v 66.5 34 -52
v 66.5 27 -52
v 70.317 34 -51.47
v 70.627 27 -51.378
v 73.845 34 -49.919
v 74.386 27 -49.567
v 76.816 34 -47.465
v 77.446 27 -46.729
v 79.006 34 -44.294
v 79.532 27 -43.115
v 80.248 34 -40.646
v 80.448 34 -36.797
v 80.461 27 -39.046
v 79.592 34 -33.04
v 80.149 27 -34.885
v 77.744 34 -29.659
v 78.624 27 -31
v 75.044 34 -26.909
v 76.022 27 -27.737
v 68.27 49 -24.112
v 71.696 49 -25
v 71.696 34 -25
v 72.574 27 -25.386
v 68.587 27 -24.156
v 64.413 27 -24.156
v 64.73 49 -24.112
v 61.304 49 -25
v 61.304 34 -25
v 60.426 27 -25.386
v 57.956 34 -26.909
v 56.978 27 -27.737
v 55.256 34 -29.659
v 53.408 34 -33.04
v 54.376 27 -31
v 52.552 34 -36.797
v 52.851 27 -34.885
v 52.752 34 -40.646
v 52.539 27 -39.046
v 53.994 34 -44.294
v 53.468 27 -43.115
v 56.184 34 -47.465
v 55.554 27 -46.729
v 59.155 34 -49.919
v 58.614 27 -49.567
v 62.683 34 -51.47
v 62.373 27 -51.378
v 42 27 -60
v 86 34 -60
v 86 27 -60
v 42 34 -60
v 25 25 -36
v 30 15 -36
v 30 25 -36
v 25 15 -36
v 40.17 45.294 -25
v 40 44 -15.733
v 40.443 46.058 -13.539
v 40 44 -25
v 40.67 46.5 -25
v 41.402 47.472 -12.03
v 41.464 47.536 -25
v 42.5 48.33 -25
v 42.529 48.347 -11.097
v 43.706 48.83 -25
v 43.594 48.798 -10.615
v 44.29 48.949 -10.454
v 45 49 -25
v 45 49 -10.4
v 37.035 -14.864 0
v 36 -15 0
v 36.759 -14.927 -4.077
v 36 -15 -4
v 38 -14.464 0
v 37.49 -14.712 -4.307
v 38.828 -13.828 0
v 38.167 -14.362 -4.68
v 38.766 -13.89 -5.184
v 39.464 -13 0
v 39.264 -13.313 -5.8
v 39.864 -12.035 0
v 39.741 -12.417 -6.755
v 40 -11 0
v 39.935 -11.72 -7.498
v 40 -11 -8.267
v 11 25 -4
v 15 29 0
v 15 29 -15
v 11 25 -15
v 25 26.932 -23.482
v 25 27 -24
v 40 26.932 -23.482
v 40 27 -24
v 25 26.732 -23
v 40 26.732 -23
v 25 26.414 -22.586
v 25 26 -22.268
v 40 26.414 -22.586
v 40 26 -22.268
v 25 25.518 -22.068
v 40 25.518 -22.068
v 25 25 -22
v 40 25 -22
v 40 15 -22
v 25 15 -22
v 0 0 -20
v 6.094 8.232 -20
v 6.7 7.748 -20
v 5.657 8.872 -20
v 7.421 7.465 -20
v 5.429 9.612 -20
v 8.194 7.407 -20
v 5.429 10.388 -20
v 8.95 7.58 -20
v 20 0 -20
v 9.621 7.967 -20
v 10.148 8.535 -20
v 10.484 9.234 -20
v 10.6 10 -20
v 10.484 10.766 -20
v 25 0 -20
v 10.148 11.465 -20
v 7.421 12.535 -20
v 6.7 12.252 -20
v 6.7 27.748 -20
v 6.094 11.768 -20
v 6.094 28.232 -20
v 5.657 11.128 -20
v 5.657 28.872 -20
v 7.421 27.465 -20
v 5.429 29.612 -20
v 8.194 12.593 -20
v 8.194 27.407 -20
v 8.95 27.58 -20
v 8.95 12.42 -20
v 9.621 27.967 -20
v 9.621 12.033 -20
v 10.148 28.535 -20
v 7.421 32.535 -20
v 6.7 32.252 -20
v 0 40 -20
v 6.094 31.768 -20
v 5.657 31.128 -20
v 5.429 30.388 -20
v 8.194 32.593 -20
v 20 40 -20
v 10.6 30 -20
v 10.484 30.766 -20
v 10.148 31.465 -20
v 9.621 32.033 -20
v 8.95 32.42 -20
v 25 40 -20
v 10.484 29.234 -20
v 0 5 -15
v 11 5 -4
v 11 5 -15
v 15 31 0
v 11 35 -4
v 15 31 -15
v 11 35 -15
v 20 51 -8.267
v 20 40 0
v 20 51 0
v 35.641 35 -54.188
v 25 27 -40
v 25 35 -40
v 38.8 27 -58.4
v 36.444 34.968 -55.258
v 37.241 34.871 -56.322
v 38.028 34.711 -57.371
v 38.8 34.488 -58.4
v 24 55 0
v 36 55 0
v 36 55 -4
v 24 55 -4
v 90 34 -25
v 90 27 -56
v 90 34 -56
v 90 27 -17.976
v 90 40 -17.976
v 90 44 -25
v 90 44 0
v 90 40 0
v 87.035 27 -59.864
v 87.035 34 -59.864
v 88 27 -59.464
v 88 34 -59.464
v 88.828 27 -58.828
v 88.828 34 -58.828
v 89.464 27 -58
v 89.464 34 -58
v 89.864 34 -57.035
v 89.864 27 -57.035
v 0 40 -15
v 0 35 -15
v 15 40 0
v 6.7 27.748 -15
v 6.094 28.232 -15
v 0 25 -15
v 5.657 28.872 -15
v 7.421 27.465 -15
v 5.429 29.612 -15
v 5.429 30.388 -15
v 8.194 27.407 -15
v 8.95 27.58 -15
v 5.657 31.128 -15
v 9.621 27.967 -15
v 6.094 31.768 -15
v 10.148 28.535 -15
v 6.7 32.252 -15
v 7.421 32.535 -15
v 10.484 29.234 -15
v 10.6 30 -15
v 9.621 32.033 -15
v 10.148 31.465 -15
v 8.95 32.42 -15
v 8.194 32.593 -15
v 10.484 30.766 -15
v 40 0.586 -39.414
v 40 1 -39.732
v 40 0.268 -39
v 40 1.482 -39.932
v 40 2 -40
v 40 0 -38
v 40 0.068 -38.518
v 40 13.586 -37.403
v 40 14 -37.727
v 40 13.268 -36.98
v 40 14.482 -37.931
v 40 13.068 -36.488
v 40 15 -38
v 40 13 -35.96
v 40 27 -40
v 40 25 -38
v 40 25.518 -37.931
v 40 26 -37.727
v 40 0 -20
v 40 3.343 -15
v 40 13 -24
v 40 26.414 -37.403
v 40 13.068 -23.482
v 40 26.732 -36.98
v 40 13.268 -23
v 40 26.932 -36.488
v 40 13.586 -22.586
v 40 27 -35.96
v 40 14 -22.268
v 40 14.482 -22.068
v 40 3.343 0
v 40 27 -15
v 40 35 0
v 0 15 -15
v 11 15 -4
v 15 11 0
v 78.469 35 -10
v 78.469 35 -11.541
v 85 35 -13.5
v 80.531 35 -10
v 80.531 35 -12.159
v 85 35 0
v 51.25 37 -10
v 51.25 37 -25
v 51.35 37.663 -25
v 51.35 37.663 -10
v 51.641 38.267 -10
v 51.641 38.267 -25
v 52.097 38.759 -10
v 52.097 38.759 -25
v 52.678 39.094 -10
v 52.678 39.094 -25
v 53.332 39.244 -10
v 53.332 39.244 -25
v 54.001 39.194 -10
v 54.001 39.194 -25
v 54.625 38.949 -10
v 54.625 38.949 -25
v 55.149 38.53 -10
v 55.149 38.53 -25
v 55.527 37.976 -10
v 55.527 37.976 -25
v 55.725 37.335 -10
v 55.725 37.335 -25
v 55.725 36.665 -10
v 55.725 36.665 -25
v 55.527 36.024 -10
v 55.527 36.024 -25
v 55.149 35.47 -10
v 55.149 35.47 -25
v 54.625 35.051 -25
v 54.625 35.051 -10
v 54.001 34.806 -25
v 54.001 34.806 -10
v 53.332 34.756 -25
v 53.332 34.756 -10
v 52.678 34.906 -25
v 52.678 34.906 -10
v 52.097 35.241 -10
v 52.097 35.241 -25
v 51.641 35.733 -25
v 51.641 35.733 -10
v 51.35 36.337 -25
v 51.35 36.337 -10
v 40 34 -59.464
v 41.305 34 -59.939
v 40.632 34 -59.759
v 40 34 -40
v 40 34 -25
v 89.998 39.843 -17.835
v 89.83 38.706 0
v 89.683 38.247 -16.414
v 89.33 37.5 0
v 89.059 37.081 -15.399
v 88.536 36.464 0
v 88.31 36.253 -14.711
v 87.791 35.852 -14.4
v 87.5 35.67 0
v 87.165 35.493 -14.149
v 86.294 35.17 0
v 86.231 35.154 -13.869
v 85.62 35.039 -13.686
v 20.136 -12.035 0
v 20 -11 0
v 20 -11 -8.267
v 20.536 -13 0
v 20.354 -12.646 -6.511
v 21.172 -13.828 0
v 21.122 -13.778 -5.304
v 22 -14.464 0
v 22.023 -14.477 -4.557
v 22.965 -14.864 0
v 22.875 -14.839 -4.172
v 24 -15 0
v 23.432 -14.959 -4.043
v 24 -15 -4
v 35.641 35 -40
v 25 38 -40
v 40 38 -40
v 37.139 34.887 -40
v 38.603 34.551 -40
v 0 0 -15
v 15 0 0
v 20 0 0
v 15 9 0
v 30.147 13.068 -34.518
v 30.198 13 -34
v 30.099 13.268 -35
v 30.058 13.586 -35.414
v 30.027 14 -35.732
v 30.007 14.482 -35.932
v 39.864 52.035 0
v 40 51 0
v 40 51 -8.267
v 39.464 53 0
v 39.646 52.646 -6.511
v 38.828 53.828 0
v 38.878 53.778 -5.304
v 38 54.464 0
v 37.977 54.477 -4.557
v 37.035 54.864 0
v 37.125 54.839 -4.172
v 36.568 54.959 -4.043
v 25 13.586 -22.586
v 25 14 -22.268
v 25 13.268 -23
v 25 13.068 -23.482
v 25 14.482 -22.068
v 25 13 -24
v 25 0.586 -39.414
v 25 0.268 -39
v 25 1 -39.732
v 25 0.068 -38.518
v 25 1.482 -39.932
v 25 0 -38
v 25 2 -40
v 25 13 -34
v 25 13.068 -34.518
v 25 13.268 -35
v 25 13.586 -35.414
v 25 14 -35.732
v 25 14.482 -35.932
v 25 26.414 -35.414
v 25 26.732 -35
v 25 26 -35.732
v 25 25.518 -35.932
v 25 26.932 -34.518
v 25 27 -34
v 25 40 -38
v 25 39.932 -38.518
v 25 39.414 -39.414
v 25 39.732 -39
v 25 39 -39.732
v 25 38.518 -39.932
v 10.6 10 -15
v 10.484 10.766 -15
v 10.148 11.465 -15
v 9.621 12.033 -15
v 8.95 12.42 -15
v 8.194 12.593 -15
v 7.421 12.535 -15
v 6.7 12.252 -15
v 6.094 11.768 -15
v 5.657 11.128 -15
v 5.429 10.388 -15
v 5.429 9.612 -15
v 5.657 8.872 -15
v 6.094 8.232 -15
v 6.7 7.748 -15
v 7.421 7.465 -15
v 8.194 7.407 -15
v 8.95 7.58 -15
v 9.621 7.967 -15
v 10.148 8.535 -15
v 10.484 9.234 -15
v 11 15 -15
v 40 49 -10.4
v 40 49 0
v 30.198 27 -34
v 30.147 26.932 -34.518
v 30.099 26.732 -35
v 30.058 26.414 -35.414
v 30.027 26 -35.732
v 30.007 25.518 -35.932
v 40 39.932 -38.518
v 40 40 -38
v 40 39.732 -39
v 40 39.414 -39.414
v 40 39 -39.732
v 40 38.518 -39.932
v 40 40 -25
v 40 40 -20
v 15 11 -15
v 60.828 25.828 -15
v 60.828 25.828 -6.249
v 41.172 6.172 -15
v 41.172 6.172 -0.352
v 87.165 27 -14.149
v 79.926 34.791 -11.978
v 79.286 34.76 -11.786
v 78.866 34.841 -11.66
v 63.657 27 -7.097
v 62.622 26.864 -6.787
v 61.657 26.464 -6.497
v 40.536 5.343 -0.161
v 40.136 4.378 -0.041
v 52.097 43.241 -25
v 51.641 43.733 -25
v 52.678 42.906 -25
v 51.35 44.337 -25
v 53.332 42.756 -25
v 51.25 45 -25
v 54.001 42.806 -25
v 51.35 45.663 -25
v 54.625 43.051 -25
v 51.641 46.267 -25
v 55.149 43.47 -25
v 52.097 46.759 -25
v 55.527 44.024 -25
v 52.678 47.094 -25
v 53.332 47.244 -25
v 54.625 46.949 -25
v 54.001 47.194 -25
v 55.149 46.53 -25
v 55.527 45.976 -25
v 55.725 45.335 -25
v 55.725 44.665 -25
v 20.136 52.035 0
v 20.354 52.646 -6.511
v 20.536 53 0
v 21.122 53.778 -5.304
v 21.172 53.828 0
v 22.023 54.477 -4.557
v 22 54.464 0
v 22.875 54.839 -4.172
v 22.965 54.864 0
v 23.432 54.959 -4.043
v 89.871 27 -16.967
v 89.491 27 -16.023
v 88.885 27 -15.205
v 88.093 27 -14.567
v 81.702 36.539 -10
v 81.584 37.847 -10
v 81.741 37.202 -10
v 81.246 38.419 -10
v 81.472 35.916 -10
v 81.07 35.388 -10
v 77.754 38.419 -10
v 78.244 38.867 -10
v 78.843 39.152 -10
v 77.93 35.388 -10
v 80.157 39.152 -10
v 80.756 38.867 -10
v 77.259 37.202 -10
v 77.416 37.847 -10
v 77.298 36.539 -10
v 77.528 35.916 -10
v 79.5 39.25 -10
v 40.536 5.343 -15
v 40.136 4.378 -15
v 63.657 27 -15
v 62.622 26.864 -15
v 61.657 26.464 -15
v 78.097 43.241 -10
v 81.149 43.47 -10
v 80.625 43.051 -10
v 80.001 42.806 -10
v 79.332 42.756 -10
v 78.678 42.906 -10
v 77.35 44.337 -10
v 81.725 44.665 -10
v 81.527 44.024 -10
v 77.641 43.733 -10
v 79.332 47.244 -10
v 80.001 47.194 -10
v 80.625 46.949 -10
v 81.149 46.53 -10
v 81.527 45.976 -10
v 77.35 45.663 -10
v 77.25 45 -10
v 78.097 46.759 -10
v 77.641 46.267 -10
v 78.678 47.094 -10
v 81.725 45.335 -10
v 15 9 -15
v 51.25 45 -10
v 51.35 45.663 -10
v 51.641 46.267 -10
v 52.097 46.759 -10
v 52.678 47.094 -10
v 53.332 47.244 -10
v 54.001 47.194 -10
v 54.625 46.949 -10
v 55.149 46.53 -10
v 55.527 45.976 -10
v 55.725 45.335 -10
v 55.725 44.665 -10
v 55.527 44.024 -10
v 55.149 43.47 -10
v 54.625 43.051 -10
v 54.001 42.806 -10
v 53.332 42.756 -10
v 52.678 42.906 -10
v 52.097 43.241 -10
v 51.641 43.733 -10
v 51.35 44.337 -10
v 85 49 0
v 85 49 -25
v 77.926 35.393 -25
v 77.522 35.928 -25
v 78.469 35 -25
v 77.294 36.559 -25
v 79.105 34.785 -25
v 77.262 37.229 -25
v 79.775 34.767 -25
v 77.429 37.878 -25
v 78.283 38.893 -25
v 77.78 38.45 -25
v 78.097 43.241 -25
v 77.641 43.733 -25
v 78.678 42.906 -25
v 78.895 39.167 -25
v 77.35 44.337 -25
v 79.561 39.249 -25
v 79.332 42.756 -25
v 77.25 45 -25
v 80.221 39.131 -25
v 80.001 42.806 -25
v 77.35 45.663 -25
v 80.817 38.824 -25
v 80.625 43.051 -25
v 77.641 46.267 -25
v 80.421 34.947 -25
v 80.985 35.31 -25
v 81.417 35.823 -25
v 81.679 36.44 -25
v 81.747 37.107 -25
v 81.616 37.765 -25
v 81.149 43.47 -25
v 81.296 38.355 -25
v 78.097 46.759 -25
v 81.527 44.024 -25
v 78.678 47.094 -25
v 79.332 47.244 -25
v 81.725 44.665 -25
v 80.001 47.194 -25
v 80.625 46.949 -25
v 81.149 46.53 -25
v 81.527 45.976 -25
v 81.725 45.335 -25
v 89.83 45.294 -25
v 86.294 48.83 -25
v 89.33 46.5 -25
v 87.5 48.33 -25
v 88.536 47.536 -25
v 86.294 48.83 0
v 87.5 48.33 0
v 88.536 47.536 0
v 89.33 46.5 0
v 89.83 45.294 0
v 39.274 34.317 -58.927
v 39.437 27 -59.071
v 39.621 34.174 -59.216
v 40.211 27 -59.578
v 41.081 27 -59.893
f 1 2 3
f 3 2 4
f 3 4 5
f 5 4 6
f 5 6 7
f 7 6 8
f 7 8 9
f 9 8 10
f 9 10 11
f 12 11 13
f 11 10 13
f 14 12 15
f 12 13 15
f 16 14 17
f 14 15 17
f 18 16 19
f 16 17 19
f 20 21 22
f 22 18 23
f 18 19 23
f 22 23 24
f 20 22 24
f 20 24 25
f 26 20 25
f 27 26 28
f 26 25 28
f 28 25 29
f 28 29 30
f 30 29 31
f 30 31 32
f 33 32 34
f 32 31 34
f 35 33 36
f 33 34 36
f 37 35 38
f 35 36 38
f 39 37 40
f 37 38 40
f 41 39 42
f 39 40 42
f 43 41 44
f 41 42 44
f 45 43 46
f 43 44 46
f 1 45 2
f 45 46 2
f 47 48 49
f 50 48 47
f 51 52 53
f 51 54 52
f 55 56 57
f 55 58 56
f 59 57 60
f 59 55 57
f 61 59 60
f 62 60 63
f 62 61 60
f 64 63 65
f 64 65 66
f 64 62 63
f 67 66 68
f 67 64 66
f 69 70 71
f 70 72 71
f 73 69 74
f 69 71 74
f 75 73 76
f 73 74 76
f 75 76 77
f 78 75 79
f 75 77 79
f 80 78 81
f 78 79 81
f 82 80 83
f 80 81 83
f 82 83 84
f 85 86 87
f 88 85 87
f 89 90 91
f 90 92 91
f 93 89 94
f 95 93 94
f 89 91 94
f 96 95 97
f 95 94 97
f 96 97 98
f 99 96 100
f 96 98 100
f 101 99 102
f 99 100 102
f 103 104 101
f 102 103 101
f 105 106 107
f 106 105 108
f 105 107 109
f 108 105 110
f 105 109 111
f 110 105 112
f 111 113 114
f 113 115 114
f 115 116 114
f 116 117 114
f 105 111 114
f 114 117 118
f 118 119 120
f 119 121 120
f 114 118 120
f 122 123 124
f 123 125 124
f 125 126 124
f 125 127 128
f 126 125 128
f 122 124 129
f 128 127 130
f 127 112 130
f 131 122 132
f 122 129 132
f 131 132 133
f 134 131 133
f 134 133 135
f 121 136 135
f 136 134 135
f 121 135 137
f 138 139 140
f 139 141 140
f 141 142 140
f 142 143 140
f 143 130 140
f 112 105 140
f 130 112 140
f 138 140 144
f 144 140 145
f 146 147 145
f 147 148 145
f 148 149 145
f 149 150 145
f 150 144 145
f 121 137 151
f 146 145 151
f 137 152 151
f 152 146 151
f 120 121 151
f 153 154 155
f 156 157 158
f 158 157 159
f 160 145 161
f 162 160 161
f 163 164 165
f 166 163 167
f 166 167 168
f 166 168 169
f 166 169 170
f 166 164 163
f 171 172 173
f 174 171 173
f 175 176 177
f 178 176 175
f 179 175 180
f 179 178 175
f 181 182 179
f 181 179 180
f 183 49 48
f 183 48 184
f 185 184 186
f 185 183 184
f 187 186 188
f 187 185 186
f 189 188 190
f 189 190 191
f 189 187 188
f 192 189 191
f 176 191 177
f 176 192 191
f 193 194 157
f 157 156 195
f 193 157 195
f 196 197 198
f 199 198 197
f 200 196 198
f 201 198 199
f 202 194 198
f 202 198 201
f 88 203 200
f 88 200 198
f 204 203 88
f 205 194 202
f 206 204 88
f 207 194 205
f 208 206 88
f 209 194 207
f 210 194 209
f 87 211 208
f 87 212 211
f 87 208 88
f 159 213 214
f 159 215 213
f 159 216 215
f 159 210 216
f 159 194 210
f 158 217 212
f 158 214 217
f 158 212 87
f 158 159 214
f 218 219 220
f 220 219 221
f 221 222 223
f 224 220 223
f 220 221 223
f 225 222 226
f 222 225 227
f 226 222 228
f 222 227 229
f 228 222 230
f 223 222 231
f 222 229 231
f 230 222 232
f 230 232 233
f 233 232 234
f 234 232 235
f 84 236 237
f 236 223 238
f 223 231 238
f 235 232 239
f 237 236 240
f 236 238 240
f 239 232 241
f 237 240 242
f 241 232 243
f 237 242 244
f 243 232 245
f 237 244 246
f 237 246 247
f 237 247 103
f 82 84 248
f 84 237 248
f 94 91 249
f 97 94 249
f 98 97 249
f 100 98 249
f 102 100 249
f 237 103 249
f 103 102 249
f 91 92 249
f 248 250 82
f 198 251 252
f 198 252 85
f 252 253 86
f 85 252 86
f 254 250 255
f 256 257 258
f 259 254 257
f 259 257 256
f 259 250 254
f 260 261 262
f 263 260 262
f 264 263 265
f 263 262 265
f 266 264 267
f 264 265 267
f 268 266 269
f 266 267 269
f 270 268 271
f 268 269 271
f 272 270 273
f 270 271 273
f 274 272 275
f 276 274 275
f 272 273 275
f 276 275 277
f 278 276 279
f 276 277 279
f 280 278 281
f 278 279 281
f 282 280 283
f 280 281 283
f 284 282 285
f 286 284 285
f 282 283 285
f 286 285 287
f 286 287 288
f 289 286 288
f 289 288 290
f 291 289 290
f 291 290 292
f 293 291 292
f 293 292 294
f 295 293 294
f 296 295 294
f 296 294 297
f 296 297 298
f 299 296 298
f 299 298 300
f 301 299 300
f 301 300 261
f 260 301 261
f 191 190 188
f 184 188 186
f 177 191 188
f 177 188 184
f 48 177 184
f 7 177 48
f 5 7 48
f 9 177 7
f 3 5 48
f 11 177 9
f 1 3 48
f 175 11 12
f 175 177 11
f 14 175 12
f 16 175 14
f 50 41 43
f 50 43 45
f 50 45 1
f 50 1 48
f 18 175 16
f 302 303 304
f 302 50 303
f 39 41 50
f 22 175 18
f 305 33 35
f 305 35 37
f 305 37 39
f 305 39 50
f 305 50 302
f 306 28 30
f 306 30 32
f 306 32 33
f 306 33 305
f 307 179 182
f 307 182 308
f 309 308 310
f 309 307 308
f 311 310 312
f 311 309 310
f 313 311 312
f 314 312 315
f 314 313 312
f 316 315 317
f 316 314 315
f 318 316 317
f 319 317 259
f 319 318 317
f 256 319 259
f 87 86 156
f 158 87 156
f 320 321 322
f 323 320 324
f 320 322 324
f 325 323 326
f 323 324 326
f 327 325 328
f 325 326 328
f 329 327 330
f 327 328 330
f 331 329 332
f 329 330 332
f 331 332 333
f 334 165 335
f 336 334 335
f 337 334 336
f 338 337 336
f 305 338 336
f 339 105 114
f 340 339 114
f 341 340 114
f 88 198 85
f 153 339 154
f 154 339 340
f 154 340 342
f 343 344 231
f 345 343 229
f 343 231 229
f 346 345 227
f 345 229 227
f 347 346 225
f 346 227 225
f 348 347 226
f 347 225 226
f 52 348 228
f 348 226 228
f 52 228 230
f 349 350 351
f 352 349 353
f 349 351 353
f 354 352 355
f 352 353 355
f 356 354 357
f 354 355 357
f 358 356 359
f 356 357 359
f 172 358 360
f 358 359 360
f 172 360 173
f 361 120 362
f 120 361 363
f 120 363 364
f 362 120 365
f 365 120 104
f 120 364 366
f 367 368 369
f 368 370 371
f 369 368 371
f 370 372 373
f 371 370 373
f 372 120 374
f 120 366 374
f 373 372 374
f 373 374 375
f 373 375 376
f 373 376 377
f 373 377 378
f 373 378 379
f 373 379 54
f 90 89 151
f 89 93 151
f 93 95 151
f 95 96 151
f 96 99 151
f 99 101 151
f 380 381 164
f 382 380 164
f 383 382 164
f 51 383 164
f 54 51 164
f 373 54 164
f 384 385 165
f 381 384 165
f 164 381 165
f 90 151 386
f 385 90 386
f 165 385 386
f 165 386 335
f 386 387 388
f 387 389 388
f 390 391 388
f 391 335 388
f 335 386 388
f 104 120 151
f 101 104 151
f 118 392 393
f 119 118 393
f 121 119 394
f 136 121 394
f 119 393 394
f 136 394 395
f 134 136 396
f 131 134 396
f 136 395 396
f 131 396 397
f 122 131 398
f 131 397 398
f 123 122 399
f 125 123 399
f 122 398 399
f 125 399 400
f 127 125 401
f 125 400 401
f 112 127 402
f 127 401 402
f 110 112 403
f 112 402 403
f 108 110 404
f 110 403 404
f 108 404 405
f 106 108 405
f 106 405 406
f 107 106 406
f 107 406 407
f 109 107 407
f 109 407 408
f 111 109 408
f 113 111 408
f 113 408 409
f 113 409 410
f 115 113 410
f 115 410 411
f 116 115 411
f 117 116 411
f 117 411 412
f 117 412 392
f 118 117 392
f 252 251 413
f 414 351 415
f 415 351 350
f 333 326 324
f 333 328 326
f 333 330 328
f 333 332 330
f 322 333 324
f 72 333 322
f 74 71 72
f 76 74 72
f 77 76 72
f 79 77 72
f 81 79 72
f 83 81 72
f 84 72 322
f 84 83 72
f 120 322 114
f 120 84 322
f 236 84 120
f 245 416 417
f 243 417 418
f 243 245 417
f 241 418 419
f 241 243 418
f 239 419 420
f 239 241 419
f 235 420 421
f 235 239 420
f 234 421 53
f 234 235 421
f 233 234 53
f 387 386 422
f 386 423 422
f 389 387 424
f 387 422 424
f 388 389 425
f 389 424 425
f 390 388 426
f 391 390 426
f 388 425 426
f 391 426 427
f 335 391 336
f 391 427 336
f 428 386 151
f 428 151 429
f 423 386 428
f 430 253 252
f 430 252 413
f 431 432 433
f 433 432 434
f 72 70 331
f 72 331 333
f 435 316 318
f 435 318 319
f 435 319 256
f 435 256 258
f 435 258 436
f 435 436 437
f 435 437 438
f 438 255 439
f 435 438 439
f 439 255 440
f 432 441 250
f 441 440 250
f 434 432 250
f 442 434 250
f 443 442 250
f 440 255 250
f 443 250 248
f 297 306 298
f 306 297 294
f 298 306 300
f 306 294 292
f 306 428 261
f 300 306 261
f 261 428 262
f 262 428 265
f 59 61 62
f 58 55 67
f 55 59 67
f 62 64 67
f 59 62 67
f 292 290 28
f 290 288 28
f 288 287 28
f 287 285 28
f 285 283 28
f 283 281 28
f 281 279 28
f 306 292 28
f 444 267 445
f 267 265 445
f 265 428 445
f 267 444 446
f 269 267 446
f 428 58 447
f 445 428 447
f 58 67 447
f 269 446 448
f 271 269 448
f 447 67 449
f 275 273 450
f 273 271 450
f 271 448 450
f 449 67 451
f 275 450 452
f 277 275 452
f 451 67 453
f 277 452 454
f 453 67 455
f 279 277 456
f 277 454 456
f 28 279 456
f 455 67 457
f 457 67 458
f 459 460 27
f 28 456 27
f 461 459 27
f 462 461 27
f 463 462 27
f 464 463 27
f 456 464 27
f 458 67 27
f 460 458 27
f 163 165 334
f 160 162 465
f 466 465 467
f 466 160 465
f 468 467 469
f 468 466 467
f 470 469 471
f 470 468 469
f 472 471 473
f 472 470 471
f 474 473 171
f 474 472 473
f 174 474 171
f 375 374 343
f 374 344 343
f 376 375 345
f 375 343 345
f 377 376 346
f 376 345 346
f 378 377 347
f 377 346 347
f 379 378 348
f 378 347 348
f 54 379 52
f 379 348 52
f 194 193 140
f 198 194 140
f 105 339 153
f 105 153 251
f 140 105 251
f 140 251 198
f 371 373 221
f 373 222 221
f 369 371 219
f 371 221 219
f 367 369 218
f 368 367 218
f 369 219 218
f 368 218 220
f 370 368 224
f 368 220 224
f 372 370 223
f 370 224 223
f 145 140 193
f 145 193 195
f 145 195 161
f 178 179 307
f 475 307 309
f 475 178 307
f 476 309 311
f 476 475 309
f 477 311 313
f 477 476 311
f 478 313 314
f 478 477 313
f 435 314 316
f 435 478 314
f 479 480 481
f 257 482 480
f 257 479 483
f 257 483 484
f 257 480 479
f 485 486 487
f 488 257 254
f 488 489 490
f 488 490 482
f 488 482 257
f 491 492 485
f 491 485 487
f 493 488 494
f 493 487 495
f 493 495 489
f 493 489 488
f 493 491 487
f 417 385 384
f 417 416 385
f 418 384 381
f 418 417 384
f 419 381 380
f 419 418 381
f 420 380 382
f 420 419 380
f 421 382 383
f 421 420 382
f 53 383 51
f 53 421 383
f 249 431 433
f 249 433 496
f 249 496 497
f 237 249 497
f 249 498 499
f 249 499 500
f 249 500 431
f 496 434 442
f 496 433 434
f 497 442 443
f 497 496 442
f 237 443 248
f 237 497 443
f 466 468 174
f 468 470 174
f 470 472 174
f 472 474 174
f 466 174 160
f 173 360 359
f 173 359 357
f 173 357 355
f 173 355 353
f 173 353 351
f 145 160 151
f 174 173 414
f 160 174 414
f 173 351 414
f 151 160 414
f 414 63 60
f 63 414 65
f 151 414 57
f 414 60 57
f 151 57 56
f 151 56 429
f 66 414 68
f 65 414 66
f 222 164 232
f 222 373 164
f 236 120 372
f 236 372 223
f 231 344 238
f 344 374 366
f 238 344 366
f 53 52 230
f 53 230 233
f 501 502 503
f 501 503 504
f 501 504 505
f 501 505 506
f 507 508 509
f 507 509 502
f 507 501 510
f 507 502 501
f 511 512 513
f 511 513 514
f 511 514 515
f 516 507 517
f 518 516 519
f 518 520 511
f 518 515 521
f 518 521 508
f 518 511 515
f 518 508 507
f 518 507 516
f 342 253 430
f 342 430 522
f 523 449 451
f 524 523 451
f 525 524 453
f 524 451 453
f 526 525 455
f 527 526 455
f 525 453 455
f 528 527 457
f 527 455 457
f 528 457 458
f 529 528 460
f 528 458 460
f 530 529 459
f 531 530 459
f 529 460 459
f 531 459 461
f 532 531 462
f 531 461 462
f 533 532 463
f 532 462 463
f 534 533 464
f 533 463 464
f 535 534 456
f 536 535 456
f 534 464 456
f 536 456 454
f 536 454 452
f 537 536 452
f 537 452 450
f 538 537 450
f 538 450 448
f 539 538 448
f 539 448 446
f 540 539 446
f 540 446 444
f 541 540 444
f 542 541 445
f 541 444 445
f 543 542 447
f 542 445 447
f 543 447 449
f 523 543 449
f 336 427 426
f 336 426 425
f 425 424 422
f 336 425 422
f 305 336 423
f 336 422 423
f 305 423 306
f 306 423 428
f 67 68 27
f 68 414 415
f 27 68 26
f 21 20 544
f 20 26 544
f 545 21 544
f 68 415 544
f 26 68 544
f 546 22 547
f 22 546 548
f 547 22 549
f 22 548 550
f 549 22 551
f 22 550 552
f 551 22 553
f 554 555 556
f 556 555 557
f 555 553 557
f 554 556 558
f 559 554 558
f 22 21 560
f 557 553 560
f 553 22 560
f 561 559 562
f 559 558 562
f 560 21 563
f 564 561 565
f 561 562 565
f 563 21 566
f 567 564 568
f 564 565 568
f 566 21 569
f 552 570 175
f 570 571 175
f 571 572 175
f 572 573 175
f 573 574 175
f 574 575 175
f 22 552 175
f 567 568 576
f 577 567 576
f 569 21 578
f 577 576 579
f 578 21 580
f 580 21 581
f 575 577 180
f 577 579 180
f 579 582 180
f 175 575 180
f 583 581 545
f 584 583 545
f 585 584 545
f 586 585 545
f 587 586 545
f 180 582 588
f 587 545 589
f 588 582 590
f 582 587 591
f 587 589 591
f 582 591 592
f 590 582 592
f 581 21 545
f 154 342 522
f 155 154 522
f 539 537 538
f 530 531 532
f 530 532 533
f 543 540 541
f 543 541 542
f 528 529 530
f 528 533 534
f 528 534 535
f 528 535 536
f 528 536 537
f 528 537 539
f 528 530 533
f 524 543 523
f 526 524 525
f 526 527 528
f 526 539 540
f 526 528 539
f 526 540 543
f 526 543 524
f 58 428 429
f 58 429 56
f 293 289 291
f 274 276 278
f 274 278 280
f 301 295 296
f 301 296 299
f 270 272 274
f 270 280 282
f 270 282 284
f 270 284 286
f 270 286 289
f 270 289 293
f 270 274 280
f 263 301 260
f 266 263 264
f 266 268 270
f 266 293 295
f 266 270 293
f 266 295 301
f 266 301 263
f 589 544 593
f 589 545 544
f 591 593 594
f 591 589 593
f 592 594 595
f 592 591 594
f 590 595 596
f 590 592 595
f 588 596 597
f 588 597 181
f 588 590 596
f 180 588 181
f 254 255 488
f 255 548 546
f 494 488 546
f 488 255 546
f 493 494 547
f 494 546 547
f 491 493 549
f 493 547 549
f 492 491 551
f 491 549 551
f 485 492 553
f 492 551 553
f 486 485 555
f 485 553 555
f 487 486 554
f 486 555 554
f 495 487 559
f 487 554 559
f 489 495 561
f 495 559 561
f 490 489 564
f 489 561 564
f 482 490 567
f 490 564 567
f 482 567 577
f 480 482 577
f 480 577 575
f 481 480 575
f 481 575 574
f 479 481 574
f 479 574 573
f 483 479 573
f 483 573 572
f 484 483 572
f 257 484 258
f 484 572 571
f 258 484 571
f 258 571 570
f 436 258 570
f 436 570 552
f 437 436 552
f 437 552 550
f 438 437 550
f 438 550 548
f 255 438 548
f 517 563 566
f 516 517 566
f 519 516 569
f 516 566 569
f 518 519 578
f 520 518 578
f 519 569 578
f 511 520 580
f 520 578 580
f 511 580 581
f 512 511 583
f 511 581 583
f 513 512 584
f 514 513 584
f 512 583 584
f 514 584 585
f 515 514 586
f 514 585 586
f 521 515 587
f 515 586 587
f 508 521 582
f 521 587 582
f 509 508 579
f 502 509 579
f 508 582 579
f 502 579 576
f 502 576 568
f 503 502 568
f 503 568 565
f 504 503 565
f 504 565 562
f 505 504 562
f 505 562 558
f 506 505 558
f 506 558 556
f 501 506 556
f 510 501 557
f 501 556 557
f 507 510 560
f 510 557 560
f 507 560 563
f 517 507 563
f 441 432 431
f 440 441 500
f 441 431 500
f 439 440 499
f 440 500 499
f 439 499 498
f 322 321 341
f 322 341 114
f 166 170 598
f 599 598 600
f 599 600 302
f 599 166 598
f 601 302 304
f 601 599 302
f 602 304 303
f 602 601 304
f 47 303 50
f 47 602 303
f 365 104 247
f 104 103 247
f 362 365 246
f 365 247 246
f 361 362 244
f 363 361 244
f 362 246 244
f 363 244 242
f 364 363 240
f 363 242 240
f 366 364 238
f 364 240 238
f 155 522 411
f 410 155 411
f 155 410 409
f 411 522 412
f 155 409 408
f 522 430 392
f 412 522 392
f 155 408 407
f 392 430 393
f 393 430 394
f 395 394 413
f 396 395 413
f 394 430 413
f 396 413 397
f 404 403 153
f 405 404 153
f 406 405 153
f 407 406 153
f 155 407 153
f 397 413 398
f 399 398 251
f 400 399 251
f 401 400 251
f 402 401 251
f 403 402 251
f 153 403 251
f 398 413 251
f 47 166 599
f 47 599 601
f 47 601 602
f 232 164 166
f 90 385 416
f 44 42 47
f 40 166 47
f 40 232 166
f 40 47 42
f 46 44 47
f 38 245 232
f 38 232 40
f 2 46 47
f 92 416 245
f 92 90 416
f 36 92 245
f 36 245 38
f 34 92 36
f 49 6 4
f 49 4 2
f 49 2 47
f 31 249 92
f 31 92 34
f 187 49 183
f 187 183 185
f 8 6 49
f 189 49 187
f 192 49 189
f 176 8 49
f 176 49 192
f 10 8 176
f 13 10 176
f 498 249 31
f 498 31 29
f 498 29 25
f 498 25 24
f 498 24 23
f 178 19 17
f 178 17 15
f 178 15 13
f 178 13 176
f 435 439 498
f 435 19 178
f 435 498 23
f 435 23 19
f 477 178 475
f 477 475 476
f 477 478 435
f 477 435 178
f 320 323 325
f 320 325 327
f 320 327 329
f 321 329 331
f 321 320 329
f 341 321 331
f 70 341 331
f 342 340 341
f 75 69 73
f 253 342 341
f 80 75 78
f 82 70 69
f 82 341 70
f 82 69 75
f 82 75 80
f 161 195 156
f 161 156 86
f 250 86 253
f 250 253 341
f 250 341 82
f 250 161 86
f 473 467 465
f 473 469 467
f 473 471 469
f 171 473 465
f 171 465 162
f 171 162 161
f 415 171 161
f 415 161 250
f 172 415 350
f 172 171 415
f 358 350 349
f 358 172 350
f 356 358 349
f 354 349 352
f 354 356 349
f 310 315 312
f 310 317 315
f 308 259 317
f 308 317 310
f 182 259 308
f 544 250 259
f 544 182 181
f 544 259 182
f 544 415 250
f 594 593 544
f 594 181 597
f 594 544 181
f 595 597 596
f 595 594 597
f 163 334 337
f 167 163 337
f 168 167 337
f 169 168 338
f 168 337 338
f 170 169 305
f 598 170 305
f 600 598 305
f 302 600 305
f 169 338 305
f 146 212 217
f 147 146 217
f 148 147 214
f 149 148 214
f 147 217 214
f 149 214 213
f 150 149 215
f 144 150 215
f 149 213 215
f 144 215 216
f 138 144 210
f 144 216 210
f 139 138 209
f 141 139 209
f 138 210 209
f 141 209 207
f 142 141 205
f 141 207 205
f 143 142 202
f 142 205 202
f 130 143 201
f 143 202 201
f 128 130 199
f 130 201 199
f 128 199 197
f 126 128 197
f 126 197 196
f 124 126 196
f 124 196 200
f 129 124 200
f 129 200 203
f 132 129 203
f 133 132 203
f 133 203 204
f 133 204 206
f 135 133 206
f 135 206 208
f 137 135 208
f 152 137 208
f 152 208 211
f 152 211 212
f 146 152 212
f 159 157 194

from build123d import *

# Parameters (mm, degrees)
SKETCH1_W                = 40
SKETCH1_H                = 40
BOSS_EXTRUDE1_DEPTH      = 40
SKETCH2_W                = 25
SKETCH2_H                = 20
CUT_EXTRUDE1_DEPTH       = 40
CHAMFER1_SIZE            = 15
CUT_EXTRUDE2_DEPTH       = 15
CHAMFER2_SIZE            = 4
SKETCH4_R                = 2.6
CUT_EXTRUDE3_DEPTH       = 17
BOSS_EXTRUDE3_DEPTH      = 20
FILLET3_R                = 4
BOSS_EXTRUDE2_DEPTH      = 20
BOSS_EXTRUDE2_DEPTH_BACK = 25
SKETCH5_W                = 50
SKETCH5_H                = 8
SKETCH10_R               = 14
CUT_EXTRUDE4_DEPTH       = 10
CHAMFER3_SIZE            = 15
CHAMFER3_SIZE_2          = 20
CHAMFER4_SIZE2           = 50
CHAMFER4_SIZE            = 15
FILLET5_START            = 26
FILLET5_DEPTH            = 10
FILLET6_R                = 2
CHAMFER5_SIZE            = 22
SKETCH11_W               = 27.237482008
SKETCH11_H               = 25
CUT_EXTRUDE5_DEPTH       = 25
FILLET7_R                = 4
SKETCH16_W               = 14
SKETCH16_H               = 14
CUT_EXTRUDE6_DEPTH       = 43
CHAMFER6_SIZE            = 10
CHAMFER6_SIZE2           = 2
FILLET9_R                = 2
SKETCH18_W               = 50
SKETCH18_H               = 14
BOSS_EXTRUDE4_DEPTH      = 25
SKETCH19_R               = 2.25
CUT_EXTRUDE7_DEPTH       = 15
FILLET10_R               = 5
SKETCH20_W               = 50
SKETCH20_H               = 1
CUT_EXTRUDE8_DEPTH       = 69
FILLET11_R               = 10
SKETCH21_R               = 14
CUT_EXTRUDE9_DEPTH       = 69


with BuildPart() as part:
    # Sketch1 → Boss-Extrude1 (new body)
    with BuildSketch(Plane(origin=(0, 0, 0), x_dir=(1, 0, 0), z_dir=(0, 1, 0))):
        with Locations((20, 20)):
            Rectangle(SKETCH1_W, SKETCH1_H)
    extrude(amount=BOSS_EXTRUDE1_DEPTH)

    # Sketch2 → Cut-Extrude1 (cut)
    with BuildSketch(Plane(origin=(0, 40, 0), x_dir=(1, 0, 0), z_dir=(0, 1, 0))):
        with Locations((12.5, 30)):
            Rectangle(SKETCH2_W, SKETCH2_H)
    extrude(amount=-CUT_EXTRUDE1_DEPTH, mode=Mode.SUBTRACT)

    # Chamfer1
    chamfer1_edges = [part.edges().sort_by_distance(p)[0] for p in [
        (0, 20, 0),
    ]]
    chamfer(chamfer1_edges, length=CHAMFER1_SIZE)

    # Sketch3 → Cut-Extrude2 (cut)
    with BuildSketch(Plane.XY):
        Polygon((0, 10), (0, 15), (15, 15), (15, 5), (0, 5), align=None)
        Polygon((0, 30), (0, 25), (15, 25), (15, 35), (0, 35), align=None)
    extrude(amount=-CUT_EXTRUDE2_DEPTH, mode=Mode.SUBTRACT)

    # Chamfer2
    chamfer2_edges = [part.edges().sort_by_distance(p)[0] for p in [
        (15, 35, -7.5),
        (15, 25, -7.5),
        (15, 15, -7.5),
        (15, 5, -7.5),
    ]]
    chamfer(chamfer2_edges, length=CHAMFER2_SIZE)

    # Sketch4 → Cut-Extrude3 (cut)
    with BuildSketch(Plane.XY.offset(-15)):
        with Locations((8, 30)):
            Circle(SKETCH4_R)
        with Locations((8, 10)):
            Circle(SKETCH4_R)
    extrude(amount=-CUT_EXTRUDE3_DEPTH, mode=Mode.SUBTRACT)

    # Sketch9 → Boss-Extrude3 (add)
    with BuildSketch(Plane(origin=(40, 0, 0), x_dir=(0, 0, -1), z_dir=(1, 0, 0))):
        Polygon((0, 40), (0, 55), (4, 55), (20, 40), align=None)
        Polygon((0, 0), (0, -15), (4, -15), (20, 0), align=None)
    extrude(amount=-BOSS_EXTRUDE3_DEPTH)

    # Fillet3
    fillet3_edges = [part.edges().sort_by_distance(p)[0] for p in [
        (20, 55, -2),
        (40, 55, -2),
        (20, -15, -2),
        (40, -15, -2),
    ]]
    fillet(fillet3_edges, radius=FILLET3_R)

    # Sketch5 → Boss-Extrude2 (add, two sides: drawn at the far end of the back side and taken through both)
    with BuildSketch(Plane(origin=(0, 0, -40), x_dir=(-1, 0, 0), z_dir=(0, 0, -1)).offset(-BOSS_EXTRUDE2_DEPTH_BACK)):
        with Locations((-65, 31)):
            Rectangle(SKETCH5_W, SKETCH5_H)
    extrude(amount=BOSS_EXTRUDE2_DEPTH + BOSS_EXTRUDE2_DEPTH_BACK)

    # Sketch10 → Cut-Extrude4 (cut)
    with BuildSketch(Plane(origin=(0, 27, 0), x_dir=(-1, 0, 0), z_dir=(0, -1, 0))):
        with Locations(Location((-66.5, 38, 0), (0, 0, 90))):
            Circle(SKETCH10_R)
    extrude(amount=-CUT_EXTRUDE4_DEPTH, mode=Mode.SUBTRACT)

    # Chamfer3
    # the kernel refuses this chamfer: 20, 15 mm, written as the material it adds along each edge
    with BuildSketch(Plane(origin=(40, 27, -40), x_dir=(-1, 0, 0), z_dir=(0, 1, 0))) as chamfer3_piece_1:
        Polygon((CHAMFER3_SIZE, 0), (0, -CHAMFER3_SIZE_2), (0, 0), align=None)
    extrude(amount=8)

    # Chamfer4
    chamfer4_edges = [part.edges().sort_by_distance(p)[0] for p in [
        (40, 31, -15),
    ]]
    chamfer4_side = [part.faces().sort_by_distance(p)[0] for p in [
        (40, 31, -14.7),
    ]]
    chamfer(chamfer4_edges, length=CHAMFER4_SIZE - 0.0001, length2=CHAMFER4_SIZE2 - 0.0001, reference=chamfer4_side[0])  # a hair under: the kernel refuses the full size

    # Fillet5: read off the stored shape, not the designer's step
    # Fillet5 outline → Fillet5 (cut)
    with BuildSketch(Plane(origin=(0, 0, 0), x_dir=(1, 0, 0), z_dir=(0, 1, 0)).offset(FILLET5_START)):
        with BuildLine():
            Line((90, 15), (90, 17.976122604))
            ThreePointArc((90, 17.976122604), (89.209171713, 15.588400485), (87.149391542, 14.144817463))
            Line((87.149391542, 14.144817463), (90, 15))
        make_face()
        with BuildLine():
            ThreePointArc((38.8, 58.4), (40.211145618, 59.577708764), (42, 60))
            Line((42, 60), (40, 60))
            Line((40, 60), (38.8, 58.4))
        make_face()
        with BuildLine():
            ThreePointArc((86, 60), (88.828427125, 58.828427125), (90, 56))
            Line((90, 56), (90, 60))
            Line((90, 60), (86, 60))
        make_face()
    extrude(amount=FILLET5_DEPTH, mode=Mode.SUBTRACT)

    # Fillet6
    fillet6_edges = [part.edges().sort_by_distance(p)[0] for p in [
        (32.5, 40, -40),
        (32.5, 0, -40),
    ]]
    fillet(fillet6_edges, radius=FILLET6_R)

    # Chamfer5
    # the kernel refuses this chamfer: 22 mm, written as the material it adds along each edge
    with BuildSketch(Plane(origin=(40, 27, 56.576925735), x_dir=(1, 0, 0), z_dir=(0, 0, -1))) as chamfer5_piece_1_section:
        Polygon((CHAMFER5_SIZE, 0), (0, CHAMFER5_SIZE), (0, 0), align=None)
    chamfer5_piece_1 = extrude(amount=96.576925735, mode=Mode.PRIVATE)
    chamfer5_piece_1 = split(chamfer5_piece_1, bisect_by=Plane(origin=(24.428402209, 27, 4.671357537), z_dir=(-0.2873466553275782, 0, -0.9578266542919204)), keep=Keep.TOP, mode=Mode.PRIVATE)
    chamfer5_piece_1 = chamfer5_piece_1 - Plane(origin=(66.5, 27, -38), x_dir=(0, 0, -1), z_dir=(0, -1, 0)) * Cylinder(14, 282, mode=Mode.PRIVATE)
    chamfer5_piece_1 = split(chamfer5_piece_1, bisect_by=Plane(origin=(40, 27, 0), z_dir=(0, 0, -1)), keep=Keep.TOP, mode=Mode.PRIVATE)
    add(chamfer5_piece_1)

    # Sketch11 → Cut-Extrude5 (cut)
    with BuildSketch(Plane(origin=(0, 0, -40), x_dir=(-1, 0, 0), z_dir=(0, 0, -1))):
        with Locations((-53.618741004, 14.5)):
            Rectangle(SKETCH11_W, SKETCH11_H)
    extrude(amount=-CUT_EXTRUDE5_DEPTH, mode=Mode.SUBTRACT)

    # Fillet7
    fillet7_edges = [part.edges().sort_by_distance(p)[0] for p in [
        (62, 27, -10.8000346),
        (40, 5, -7.50005),
    ]]
    fillet(fillet7_edges, radius=FILLET7_R)

    # Sketch16 → Cut-Extrude6 (cut)
    with BuildSketch(Plane.ZY):
        with Locations((-29, 20)):
            Rectangle(SKETCH16_W, SKETCH16_H)
    extrude(amount=-CUT_EXTRUDE6_DEPTH, mode=Mode.SUBTRACT)

    # Chamfer6
    chamfer6_edges = [part.edges().sort_by_distance(p)[0] for p in [
        (40, 20, -36),
    ]]
    chamfer6_side = [part.faces().sort_by_distance(p)[0] for p in [
        (32.5, 20, -36),
    ]]
    chamfer(chamfer6_edges, length=CHAMFER6_SIZE, length2=CHAMFER6_SIZE2, reference=chamfer6_side[0])

    # Fillet9
    fillet9_edges = [part.edges().sort_by_distance(p)[0] for p in [
        (32.5, 13, -22),
        (32.5, 27, -22),
        (27.5, 27, -36),
        (27.5, 13, -36),
        (35, 13, -37),
        (35, 27, -37),
    ]]
    fillet(fillet9_edges, radius=FILLET9_R)

    # Sketch18 → Boss-Extrude4 (add)
    with BuildSketch(Plane.XY):
        with Locations((65, 42)):
            Rectangle(SKETCH18_W, SKETCH18_H)
    extrude(amount=-BOSS_EXTRUDE4_DEPTH)

    # Sketch19 → Cut-Extrude7 (cut)
    with BuildSketch(Plane(origin=(0, 0, -25), x_dir=(-1, 0, 0), z_dir=(0, 0, -1))):
        with Locations((-79.5, 45)):
            Circle(SKETCH19_R)
        with Locations(Location((-79.5, 37, 0), (0, 0, 297.266044451))):
            Circle(SKETCH19_R)
        with Locations((-53.5, 45)):
            Circle(SKETCH19_R)
        with Locations((-53.5, 37)):
            Circle(SKETCH19_R)
    extrude(amount=-CUT_EXTRUDE7_DEPTH, mode=Mode.SUBTRACT)

    # Fillet10
    fillet10_edges = [part.edges().sort_by_distance(p)[0] for p in [
        (90, 35, -8.988061302),
        (90, 49, -12.5),
        (40, 49, -17.7),
    ]]
    fillet(fillet10_edges, radius=FILLET10_R)

    # Sketch20 → Cut-Extrude8 (cut)
    with BuildSketch(Plane(origin=(0, 0, -25), x_dir=(-1, 0, 0), z_dir=(0, 0, -1))):
        with Locations((-65, 34.5)):
            Rectangle(SKETCH20_W, SKETCH20_H)
    extrude(amount=CUT_EXTRUDE8_DEPTH, mode=Mode.SUBTRACT)

    # Fillet11
    # the kernel refuses this fillet: 10 mm, written as the material it takes off along each edge
    with BuildSketch(Plane(origin=(40, 35, -40), x_dir=(-1, 0, 0), z_dir=(0, 0, -1))) as fillet11_piece_1:
        with BuildLine():
            CenterArc((4.358898944, -10), FILLET11_R, 90, 25.841932763)
            Line((0, -1), (0, 0))
            Line((0, 0), (4.358898944, 0))
        make_face()
    extrude(amount=30.361348974, mode=Mode.SUBTRACT)

    # Sketch21 → Cut-Extrude9 (cut)
    with BuildSketch(Plane.XZ.offset(-35)):
        with Locations(Location((66.5, -38, 0), (0, 0, 270))):
            Circle(SKETCH21_R)
    extrude(amount=-CUT_EXTRUDE9_DEPTH, mode=Mode.SUBTRACT)


solid = part.part
